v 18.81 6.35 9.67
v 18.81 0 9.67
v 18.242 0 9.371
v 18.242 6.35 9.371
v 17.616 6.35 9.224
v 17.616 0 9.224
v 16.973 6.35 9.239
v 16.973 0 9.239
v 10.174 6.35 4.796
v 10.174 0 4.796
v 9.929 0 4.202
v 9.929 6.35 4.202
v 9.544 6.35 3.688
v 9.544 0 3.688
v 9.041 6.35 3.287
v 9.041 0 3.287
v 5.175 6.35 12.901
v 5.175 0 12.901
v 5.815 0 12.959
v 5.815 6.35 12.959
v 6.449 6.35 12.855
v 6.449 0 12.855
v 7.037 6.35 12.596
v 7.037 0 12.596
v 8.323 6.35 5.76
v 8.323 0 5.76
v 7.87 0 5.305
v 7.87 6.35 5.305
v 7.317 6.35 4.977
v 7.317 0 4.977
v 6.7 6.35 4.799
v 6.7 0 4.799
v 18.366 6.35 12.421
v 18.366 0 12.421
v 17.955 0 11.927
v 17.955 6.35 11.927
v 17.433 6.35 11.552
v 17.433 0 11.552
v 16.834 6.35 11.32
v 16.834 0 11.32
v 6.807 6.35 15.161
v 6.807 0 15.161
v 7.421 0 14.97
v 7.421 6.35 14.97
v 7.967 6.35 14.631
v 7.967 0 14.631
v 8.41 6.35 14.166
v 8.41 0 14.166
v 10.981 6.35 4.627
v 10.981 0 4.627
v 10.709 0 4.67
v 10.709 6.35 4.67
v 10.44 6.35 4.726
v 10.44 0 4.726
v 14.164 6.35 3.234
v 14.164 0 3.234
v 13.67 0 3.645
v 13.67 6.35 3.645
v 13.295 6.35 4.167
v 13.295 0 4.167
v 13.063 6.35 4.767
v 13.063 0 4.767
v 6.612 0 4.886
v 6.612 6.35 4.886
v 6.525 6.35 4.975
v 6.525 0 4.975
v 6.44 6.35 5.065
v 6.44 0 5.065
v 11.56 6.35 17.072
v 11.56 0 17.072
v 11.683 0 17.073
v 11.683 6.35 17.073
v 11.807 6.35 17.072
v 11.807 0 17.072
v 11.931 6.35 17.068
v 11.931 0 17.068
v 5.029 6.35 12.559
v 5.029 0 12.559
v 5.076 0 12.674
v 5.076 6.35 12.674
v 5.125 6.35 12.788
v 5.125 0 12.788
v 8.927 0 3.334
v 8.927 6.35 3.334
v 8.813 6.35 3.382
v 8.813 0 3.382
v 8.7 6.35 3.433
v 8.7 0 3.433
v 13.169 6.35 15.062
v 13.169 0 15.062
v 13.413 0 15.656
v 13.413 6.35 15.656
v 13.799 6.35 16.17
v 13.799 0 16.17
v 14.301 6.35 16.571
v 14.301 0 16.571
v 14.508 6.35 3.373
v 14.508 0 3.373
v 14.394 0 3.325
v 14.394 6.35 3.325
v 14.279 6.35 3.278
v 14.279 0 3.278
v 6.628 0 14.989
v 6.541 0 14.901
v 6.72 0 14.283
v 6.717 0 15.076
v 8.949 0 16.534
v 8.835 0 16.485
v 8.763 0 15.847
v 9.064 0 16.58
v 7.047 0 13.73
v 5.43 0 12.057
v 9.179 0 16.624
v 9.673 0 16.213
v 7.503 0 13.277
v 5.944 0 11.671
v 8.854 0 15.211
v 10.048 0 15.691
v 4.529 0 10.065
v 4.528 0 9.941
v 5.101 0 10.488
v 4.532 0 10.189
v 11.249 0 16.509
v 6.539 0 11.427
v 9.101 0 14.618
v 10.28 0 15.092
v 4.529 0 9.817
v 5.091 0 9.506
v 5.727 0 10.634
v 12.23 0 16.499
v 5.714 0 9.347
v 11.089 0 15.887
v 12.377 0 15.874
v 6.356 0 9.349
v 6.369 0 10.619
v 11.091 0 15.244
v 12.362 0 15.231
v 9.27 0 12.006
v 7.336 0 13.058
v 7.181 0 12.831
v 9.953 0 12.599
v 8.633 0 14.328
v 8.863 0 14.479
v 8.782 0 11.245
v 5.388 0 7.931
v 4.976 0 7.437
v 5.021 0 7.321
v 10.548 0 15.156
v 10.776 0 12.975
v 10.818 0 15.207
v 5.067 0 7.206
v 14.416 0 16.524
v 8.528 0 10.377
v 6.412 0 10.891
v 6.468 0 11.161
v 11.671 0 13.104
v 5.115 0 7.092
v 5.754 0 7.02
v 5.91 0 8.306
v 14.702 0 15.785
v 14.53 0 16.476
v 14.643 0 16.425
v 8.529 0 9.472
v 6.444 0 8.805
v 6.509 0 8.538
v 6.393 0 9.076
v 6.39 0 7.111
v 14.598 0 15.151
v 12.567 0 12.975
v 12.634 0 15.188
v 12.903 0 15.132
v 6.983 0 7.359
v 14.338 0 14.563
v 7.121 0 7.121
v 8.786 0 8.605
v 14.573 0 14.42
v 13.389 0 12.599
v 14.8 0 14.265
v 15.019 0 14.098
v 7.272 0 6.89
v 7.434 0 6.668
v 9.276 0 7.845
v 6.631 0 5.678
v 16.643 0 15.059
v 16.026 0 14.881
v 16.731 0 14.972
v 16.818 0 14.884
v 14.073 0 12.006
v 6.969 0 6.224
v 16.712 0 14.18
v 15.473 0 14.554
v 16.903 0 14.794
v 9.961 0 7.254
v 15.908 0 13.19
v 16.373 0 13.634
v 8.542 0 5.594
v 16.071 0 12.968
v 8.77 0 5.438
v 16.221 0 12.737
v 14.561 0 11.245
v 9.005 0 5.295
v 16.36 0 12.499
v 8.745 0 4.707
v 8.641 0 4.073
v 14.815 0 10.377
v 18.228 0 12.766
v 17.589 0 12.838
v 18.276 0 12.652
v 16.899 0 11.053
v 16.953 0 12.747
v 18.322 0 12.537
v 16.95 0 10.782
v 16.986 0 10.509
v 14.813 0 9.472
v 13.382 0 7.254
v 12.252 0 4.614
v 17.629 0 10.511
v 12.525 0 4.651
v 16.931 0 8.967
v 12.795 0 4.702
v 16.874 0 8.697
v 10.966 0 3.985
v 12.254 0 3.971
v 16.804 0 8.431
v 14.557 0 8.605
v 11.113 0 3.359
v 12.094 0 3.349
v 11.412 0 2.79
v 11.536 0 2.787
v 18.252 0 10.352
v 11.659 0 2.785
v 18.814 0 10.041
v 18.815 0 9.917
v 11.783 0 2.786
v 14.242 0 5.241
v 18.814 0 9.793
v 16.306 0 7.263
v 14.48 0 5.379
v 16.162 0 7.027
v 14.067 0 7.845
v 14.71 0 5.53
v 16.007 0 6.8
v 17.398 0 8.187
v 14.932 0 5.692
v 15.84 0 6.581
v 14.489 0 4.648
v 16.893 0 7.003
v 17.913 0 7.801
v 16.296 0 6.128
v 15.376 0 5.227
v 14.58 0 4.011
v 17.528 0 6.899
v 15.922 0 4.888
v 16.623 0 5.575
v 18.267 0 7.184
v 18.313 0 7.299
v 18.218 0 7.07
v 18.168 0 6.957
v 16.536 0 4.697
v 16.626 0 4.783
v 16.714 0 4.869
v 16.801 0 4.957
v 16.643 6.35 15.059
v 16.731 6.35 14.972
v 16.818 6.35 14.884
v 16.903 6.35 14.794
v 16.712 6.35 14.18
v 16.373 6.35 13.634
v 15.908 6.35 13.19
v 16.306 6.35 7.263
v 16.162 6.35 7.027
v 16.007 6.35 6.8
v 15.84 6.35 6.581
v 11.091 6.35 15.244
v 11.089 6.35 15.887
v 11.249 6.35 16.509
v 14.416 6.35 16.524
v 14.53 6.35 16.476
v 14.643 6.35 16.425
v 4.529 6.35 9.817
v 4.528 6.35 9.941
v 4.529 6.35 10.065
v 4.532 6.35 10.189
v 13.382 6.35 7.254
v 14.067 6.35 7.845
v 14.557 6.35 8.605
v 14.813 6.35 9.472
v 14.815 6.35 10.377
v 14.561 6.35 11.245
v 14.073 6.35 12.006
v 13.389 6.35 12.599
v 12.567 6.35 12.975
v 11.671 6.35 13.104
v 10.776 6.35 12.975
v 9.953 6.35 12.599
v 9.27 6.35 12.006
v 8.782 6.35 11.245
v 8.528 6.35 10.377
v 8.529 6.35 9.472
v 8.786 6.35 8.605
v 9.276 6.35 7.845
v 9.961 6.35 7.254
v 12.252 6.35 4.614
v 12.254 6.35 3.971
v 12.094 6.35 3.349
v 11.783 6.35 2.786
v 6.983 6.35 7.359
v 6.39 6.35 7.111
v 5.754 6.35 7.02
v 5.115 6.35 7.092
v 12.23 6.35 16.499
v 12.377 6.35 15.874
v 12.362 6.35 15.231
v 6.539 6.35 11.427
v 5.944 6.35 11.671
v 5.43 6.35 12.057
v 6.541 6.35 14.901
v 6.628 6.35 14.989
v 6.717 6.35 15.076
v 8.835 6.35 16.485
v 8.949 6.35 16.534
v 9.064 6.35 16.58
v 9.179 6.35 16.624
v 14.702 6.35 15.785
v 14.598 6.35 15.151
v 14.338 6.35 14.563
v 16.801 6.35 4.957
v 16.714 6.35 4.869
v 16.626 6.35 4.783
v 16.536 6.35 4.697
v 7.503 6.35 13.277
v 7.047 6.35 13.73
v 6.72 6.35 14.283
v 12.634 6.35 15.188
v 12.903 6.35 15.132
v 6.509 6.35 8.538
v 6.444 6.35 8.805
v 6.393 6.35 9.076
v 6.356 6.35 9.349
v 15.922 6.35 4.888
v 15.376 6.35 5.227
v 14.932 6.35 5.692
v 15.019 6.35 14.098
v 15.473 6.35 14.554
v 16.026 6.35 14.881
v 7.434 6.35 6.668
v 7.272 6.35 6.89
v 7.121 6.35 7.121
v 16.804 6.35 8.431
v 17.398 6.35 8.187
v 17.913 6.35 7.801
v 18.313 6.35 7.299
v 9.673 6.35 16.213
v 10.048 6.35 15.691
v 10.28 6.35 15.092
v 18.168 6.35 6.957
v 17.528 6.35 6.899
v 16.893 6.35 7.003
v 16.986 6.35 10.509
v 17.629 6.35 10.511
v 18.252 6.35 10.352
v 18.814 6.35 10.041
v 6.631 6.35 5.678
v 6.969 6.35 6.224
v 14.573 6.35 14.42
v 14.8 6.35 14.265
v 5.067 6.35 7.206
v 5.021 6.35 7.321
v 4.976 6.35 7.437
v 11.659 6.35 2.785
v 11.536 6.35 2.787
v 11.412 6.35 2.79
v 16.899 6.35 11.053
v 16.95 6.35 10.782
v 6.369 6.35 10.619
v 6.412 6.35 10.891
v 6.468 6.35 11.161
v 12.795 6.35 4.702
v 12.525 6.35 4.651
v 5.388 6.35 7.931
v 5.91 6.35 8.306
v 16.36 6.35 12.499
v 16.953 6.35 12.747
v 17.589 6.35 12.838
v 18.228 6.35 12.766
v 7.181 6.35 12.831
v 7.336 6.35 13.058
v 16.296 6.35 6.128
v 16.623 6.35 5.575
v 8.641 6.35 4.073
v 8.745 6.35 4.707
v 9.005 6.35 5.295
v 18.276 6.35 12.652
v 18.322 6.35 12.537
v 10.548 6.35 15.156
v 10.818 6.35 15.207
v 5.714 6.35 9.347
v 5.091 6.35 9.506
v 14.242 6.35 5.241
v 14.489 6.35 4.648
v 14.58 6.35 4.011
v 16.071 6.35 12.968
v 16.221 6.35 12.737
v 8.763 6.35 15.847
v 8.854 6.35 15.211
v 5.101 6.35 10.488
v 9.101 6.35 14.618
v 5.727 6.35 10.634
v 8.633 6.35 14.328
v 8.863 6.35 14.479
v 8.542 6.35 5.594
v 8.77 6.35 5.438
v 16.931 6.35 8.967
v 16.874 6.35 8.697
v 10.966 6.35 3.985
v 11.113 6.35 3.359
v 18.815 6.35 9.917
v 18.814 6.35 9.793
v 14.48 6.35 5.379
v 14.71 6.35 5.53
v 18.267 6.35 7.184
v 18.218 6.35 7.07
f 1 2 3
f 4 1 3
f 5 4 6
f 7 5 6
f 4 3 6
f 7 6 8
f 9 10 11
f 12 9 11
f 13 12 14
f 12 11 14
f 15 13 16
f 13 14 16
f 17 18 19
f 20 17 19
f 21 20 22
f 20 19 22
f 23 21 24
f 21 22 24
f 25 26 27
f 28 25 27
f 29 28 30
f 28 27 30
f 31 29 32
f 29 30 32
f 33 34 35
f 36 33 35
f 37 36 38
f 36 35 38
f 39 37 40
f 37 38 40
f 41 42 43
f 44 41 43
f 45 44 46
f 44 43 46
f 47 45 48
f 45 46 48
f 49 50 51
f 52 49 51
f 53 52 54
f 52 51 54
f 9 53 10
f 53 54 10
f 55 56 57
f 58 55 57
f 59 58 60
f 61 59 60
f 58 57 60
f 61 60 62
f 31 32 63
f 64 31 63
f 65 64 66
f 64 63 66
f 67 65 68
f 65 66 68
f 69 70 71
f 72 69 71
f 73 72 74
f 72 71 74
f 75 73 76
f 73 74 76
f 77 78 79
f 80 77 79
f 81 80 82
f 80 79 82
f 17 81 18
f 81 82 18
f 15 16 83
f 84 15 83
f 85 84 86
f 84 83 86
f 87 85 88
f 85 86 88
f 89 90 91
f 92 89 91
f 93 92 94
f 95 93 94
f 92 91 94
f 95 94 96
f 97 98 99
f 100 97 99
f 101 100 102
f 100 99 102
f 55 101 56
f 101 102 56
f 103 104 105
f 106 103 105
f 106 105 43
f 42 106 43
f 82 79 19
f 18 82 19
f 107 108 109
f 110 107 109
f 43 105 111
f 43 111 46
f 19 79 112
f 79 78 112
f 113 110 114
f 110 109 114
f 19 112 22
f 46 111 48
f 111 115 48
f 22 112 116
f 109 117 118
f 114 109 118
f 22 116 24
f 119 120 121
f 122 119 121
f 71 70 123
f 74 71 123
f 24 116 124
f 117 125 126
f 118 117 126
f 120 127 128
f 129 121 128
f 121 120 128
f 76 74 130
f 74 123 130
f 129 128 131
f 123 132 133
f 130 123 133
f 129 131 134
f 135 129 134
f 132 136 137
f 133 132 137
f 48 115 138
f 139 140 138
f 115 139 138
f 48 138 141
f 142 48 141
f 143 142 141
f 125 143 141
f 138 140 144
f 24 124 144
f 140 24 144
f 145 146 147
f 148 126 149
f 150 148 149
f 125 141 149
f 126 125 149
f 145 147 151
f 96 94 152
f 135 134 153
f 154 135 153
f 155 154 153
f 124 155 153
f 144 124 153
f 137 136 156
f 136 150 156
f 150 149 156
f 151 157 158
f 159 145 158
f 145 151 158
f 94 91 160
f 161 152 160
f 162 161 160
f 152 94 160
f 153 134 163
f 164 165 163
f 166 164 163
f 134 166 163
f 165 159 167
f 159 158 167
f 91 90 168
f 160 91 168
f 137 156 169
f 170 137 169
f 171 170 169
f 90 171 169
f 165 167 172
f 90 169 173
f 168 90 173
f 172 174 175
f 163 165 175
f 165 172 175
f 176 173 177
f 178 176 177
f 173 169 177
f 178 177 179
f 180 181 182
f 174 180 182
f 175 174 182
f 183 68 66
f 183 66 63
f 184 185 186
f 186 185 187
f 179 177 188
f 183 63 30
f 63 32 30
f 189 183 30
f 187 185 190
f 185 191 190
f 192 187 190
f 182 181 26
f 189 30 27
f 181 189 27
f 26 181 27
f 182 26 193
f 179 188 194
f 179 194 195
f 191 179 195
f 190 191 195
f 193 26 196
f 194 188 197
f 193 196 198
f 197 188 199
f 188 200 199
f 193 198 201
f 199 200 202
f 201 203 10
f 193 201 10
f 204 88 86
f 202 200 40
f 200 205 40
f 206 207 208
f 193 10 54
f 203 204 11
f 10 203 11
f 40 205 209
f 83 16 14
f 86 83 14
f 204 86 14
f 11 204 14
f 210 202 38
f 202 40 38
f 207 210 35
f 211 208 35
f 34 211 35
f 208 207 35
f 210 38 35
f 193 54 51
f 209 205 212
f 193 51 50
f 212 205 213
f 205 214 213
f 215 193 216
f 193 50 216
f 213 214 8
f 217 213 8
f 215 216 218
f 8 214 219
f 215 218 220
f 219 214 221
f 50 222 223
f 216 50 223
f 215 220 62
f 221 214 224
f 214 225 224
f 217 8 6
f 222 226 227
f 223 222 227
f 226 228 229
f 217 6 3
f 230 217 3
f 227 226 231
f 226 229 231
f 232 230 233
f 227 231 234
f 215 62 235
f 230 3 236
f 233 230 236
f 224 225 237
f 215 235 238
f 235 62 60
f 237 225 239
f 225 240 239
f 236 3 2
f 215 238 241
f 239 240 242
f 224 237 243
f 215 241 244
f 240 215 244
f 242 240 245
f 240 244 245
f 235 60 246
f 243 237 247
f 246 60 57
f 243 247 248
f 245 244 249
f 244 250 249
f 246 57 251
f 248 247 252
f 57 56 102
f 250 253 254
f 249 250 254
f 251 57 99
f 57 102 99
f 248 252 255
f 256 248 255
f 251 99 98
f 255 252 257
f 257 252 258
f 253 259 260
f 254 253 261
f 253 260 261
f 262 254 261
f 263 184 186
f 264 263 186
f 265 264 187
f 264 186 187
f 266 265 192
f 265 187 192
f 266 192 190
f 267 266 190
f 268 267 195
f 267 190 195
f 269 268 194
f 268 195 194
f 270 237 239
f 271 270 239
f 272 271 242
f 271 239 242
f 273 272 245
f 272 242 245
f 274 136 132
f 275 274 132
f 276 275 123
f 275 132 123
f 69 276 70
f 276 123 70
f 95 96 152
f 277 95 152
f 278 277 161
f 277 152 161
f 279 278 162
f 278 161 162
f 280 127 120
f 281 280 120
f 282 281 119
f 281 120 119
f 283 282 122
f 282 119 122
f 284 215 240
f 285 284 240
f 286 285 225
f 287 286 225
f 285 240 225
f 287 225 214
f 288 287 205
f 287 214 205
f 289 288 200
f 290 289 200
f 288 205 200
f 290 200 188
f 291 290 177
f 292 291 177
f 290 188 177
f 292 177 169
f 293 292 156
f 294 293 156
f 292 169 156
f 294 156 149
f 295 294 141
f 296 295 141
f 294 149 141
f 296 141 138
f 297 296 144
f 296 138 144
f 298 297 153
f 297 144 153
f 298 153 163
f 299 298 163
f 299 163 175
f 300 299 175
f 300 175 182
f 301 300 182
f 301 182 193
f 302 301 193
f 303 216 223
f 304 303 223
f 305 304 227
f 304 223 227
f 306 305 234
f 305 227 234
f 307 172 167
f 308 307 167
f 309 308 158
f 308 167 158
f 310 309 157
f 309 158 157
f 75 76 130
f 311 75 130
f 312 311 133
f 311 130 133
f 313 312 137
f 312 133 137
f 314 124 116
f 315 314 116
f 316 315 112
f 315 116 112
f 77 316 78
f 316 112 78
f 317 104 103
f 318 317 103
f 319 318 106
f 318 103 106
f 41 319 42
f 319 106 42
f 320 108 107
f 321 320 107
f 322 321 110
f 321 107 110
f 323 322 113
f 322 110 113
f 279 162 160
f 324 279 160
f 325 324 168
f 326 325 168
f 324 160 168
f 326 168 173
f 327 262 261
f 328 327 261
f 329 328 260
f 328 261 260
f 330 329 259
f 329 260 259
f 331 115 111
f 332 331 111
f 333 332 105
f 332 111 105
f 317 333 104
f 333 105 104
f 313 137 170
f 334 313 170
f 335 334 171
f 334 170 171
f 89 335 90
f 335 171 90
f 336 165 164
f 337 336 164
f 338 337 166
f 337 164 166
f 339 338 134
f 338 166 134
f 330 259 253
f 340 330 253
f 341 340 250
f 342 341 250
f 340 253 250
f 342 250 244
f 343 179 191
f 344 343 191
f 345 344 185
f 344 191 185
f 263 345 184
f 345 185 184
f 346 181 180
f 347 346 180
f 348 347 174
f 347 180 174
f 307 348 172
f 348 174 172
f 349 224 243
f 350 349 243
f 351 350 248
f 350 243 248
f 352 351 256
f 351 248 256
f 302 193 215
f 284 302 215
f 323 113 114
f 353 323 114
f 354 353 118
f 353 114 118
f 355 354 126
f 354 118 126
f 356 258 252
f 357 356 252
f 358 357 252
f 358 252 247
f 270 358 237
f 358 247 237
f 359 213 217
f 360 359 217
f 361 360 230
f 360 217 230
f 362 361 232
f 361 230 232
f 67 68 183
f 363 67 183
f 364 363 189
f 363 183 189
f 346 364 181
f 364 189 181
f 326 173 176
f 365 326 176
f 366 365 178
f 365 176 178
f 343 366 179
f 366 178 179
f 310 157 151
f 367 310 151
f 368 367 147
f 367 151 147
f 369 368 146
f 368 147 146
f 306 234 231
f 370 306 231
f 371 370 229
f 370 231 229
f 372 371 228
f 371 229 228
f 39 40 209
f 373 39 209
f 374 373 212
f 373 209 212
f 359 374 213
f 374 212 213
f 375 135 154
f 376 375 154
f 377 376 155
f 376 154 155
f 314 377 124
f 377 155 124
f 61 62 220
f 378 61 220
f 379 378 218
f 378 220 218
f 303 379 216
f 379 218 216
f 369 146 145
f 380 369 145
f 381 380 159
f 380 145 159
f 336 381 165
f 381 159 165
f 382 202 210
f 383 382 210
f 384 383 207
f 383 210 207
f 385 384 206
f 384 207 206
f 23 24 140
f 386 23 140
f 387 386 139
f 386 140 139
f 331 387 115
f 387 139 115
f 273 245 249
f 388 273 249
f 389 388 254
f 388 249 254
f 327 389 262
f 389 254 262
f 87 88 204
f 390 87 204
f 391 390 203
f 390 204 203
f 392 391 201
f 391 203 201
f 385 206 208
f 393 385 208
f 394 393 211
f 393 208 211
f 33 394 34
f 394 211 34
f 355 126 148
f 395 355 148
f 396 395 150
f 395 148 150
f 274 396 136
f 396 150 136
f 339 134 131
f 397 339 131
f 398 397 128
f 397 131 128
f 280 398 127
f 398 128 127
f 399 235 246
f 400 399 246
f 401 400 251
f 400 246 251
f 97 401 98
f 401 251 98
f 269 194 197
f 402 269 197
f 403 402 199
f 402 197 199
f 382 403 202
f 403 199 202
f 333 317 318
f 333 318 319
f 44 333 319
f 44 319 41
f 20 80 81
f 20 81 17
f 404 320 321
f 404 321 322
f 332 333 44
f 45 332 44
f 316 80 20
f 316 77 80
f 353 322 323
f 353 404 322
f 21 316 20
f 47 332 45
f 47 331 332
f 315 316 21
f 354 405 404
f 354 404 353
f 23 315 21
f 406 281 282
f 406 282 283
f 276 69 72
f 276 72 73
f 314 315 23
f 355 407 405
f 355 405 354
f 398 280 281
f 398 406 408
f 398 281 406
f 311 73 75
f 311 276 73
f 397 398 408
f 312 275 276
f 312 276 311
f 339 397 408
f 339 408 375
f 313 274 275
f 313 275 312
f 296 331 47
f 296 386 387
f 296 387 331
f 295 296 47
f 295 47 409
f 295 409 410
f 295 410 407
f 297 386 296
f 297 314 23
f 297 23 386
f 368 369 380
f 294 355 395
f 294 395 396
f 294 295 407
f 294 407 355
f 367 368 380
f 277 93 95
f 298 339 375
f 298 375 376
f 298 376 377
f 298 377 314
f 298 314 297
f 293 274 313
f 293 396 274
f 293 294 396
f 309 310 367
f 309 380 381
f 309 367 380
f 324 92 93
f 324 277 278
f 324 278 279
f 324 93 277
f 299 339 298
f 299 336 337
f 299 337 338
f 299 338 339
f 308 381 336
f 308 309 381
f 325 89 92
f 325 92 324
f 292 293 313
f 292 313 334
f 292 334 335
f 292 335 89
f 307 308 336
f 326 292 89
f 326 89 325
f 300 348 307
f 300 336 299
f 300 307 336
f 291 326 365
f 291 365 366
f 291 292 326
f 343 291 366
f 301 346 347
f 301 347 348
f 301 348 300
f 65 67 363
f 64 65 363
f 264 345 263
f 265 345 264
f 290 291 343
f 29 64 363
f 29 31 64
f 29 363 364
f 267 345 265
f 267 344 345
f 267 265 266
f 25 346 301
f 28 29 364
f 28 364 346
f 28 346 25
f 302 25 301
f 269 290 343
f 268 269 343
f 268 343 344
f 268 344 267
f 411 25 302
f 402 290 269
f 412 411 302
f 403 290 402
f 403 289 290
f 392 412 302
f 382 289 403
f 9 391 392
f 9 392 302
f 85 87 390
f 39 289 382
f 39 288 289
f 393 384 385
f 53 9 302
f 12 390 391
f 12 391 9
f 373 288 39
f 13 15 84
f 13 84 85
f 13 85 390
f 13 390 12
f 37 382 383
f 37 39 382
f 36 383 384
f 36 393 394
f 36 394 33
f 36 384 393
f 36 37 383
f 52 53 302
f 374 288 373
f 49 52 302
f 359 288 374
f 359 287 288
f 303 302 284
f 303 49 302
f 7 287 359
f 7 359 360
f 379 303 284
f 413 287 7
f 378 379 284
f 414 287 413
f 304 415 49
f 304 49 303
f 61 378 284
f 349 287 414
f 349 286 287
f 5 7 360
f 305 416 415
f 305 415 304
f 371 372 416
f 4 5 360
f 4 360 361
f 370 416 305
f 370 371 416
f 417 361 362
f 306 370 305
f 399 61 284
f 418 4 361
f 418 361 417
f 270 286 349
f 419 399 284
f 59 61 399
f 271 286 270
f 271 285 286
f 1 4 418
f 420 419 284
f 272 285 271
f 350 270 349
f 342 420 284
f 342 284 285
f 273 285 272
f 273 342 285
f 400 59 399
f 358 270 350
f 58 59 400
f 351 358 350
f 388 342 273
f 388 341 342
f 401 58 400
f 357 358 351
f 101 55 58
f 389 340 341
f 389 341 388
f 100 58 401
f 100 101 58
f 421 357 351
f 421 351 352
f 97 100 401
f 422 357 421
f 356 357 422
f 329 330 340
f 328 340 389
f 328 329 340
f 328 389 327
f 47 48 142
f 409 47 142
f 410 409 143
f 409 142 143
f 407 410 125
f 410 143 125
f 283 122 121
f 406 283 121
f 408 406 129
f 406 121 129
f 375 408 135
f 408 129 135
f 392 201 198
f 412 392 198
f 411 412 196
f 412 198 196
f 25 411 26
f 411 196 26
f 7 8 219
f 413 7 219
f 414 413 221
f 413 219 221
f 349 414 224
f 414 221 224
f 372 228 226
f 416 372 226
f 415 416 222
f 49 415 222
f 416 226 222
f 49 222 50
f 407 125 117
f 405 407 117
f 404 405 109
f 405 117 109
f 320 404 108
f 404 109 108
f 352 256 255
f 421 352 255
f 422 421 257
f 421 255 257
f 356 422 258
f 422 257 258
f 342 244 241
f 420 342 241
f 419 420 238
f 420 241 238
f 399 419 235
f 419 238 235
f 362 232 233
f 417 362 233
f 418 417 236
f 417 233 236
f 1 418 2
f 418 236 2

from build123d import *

# Parameters (mm, degrees)
BOSS_EXTRUDE1_DEPTH = 6.35


with BuildPart() as part:
    # Sketch1 → Boss-Extrude1 (new body)
    with BuildSketch(Plane(origin=(0, 0, 0), x_dir=(1, 0, 0), z_dir=(0, 1, 0))):
        with BuildLine():
            ThreePointArc((9.101190716, -14.617505223), (8.787991723, -15.525786229), (8.834558587, -16.485421328))
            ThreePointArc((8.834558587, -16.485421328), (9.005966344, -16.556955762), (9.179175886, -16.624009833))
            ThreePointArc((9.179175886, -16.624009833), (9.877166505, -15.963799948), (10.280004433, -15.09156741))
            ThreePointArc((10.280004433, -15.09156741), (10.682561911, -15.183548614), (11.091017353, -15.244188674))
            ThreePointArc((11.091017353, -15.244188674), (11.149243306, -16.203186971), (11.559501933, -17.07195383))
            ThreePointArc((11.559501933, -17.07195383), (11.745237093, -17.072448121), (11.930922326, -17.068113582))
            ThreePointArc((11.930922326, -17.068113582), (12.323130188, -16.191049737), (12.361514963, -15.231052547))
            ThreePointArc((12.361514963, -15.231052547), (12.768629261, -15.161980021), (13.16919883, -15.061695001))
            ThreePointArc((13.16919883, -15.061695001), (13.589985356, -15.925411791), (14.301477588, -16.571048531))
            ThreePointArc((14.301477588, -16.571048531), (14.473263658, -16.500427428), (14.643155688, -16.425364174))
            ThreePointArc((14.643155688, -16.425364174), (14.669870701, -15.464971388), (14.33795859, -14.563360415))
            ThreePointArc((14.33795859, -14.563360415), (14.687650245, -14.343749825), (15.019350856, -14.09780721))
            ThreePointArc((15.019350856, -14.09780721), (15.738637021, -14.734749443), (16.643044616, -15.058963723))
            ThreePointArc((16.643044616, -15.058963723), (16.774728723, -14.927978648), (16.902963029, -14.793614379))
            ThreePointArc((16.902963029, -14.793614379), (16.560118075, -13.896103748), (15.908439687, -13.19014109))
            ThreePointArc((15.908439687, -13.19014109), (16.147471316, -12.853426158), (16.359804557, -12.499268481))
            ThreePointArc((16.359804557, -12.499268481), (17.268085563, -12.812467475), (18.227720662, -12.76590061))
            ThreePointArc((18.227720662, -12.76590061), (18.299255096, -12.594492854), (18.366309167, -12.421283311))
            ThreePointArc((18.366309167, -12.421283311), (17.706099281, -11.723292693), (16.833866744, -11.320454765))
            ThreePointArc((16.833866744, -11.320454765), (16.925847948, -10.917897287), (16.986488008, -10.509441845))
            ThreePointArc((16.986488008, -10.509441845), (17.945486305, -10.451215891), (18.814253164, -10.040957265))
            ThreePointArc((18.814253164, -10.040957265), (18.814747455, -9.855222104), (18.810412916, -9.669536871))
            ThreePointArc((18.810412916, -9.669536871), (17.93334907, -9.27732901), (16.973351881, -9.238944234))
            ThreePointArc((16.973351881, -9.238944234), (16.904279354, -8.831829937), (16.803994334, -8.431260368))
            ThreePointArc((16.803994334, -8.431260368), (17.667711125, -8.010473841), (18.313347865, -7.29898161))
            ThreePointArc((18.313347865, -7.29898161), (18.242726762, -7.12719554), (18.167663508, -6.957303509))
            ThreePointArc((18.167663508, -6.957303509), (17.207270722, -6.930588496), (16.305659749, -7.262500608))
            ThreePointArc((16.305659749, -7.262500608), (16.086049159, -6.912808952), (15.840106544, -6.581108342))
            ThreePointArc((15.840106544, -6.581108342), (16.477048777, -5.861822176), (16.801263057, -4.957414582))
            ThreePointArc((16.801263057, -4.957414582), (16.670277982, -4.825730474), (16.535913713, -4.697496168))
            ThreePointArc((16.535913713, -4.697496168), (15.638403082, -5.040341123), (14.932440424, -5.69201951))
            ThreePointArc((14.932440424, -5.69201951), (14.595725492, -5.452987882), (14.241567815, -5.240654641))
            ThreePointArc((14.241567815, -5.240654641), (14.554766809, -4.332373635), (14.508199944, -3.372738536))
            ThreePointArc((14.508199944, -3.372738536), (14.336792188, -3.301204102), (14.163582645, -3.234150031))
            ThreePointArc((14.163582645, -3.234150031), (13.465592027, -3.894359916), (13.062754098, -4.766592453))
            ThreePointArc((13.062754098, -4.766592453), (12.66019662, -4.67461125), (12.251741179, -4.61397119))
            ThreePointArc((12.251741179, -4.61397119), (12.193515225, -3.654972893), (11.783256599, -2.786206034))
            ThreePointArc((11.783256599, -2.786206034), (11.597521438, -2.785711743), (11.411836205, -2.790046281))
            ThreePointArc((11.411836205, -2.790046281), (11.019628344, -3.667110127), (10.981243568, -4.627107317))
            ThreePointArc((10.981243568, -4.627107317), (10.574129271, -4.696179843), (10.173559702, -4.796464863))
            ThreePointArc((10.173559702, -4.796464863), (9.752773175, -3.932748072), (9.041280943, -3.287111332))
            ThreePointArc((9.041280943, -3.287111332), (8.869494873, -3.357732436), (8.699602843, -3.43279569))
            ThreePointArc((8.699602843, -3.43279569), (8.67288783, -4.393188476), (9.004799941, -5.294799449))
            ThreePointArc((9.004799941, -5.294799449), (8.655108286, -5.514410038), (8.323407676, -5.760352653))
            ThreePointArc((8.323407676, -5.760352653), (7.60412151, -5.123410421), (6.699713916, -4.799196141))
            ThreePointArc((6.699713916, -4.799196141), (6.568029808, -4.930181216), (6.439795502, -5.064545485))
            ThreePointArc((6.439795502, -5.064545485), (6.782640457, -5.962056116), (7.434318844, -6.668018774))
            ThreePointArc((7.434318844, -6.668018774), (7.195287216, -7.004733706), (6.982953975, -7.358891382))
            ThreePointArc((6.982953975, -7.358891382), (6.074672968, -7.045692389), (5.11503787, -7.092259254))
            ThreePointArc((5.11503787, -7.092259254), (5.043503436, -7.26366701), (4.976449365, -7.436876552))
            ThreePointArc((4.976449365, -7.436876552), (5.63665925, -8.134867171), (6.508891787, -8.537705099))
            ThreePointArc((6.508891787, -8.537705099), (6.416910584, -8.940262577), (6.356270524, -9.348718019))
            ThreePointArc((6.356270524, -9.348718019), (5.397272226, -9.406943972), (4.528505368, -9.817202599))
            ThreePointArc((4.528505368, -9.817202599), (4.528011077, -10.002937759), (4.532345615, -10.188622993))
            ThreePointArc((4.532345615, -10.188622993), (5.409409461, -10.580830854), (6.369406651, -10.61921563))
            ThreePointArc((6.369406651, -10.61921563), (6.438479177, -11.026329927), (6.538764197, -11.426899496))
            ThreePointArc((6.538764197, -11.426899496), (5.675047406, -11.847686023), (5.029410666, -12.559178254))
            ThreePointArc((5.029410666, -12.559178254), (5.10003177, -12.730964324), (5.175095023, -12.900856355))
            ThreePointArc((5.175095023, -12.900856355), (6.13548781, -12.927571367), (7.037098782, -12.595659256))
            ThreePointArc((7.037098782, -12.595659256), (7.256709372, -12.945350911), (7.502651987, -13.277051522))
            ThreePointArc((7.502651987, -13.277051522), (6.865709755, -13.996337688), (6.541495474, -14.900745282))
            ThreePointArc((6.541495474, -14.900745282), (6.672480549, -15.032429389), (6.806844819, -15.160663695))
            ThreePointArc((6.806844819, -15.160663695), (7.70435545, -14.817818741), (8.410318108, -14.166140353))
            ThreePointArc((8.410318108, -14.166140353), (8.74703304, -14.405171982), (9.101190716, -14.617505223))
        make_face()
        with BuildLine():
            Line((9.961117692, -7.254078932), (13.381640839, -7.254078932))
            ThreePointArc((13.381640839, -7.254078932), (11.671379266, -13.104079932), (9.961117692, -7.254078932))
        make_face(mode=Mode.SUBTRACT)
    extrude(amount=BOSS_EXTRUDE1_DEPTH)


solid = part.part
